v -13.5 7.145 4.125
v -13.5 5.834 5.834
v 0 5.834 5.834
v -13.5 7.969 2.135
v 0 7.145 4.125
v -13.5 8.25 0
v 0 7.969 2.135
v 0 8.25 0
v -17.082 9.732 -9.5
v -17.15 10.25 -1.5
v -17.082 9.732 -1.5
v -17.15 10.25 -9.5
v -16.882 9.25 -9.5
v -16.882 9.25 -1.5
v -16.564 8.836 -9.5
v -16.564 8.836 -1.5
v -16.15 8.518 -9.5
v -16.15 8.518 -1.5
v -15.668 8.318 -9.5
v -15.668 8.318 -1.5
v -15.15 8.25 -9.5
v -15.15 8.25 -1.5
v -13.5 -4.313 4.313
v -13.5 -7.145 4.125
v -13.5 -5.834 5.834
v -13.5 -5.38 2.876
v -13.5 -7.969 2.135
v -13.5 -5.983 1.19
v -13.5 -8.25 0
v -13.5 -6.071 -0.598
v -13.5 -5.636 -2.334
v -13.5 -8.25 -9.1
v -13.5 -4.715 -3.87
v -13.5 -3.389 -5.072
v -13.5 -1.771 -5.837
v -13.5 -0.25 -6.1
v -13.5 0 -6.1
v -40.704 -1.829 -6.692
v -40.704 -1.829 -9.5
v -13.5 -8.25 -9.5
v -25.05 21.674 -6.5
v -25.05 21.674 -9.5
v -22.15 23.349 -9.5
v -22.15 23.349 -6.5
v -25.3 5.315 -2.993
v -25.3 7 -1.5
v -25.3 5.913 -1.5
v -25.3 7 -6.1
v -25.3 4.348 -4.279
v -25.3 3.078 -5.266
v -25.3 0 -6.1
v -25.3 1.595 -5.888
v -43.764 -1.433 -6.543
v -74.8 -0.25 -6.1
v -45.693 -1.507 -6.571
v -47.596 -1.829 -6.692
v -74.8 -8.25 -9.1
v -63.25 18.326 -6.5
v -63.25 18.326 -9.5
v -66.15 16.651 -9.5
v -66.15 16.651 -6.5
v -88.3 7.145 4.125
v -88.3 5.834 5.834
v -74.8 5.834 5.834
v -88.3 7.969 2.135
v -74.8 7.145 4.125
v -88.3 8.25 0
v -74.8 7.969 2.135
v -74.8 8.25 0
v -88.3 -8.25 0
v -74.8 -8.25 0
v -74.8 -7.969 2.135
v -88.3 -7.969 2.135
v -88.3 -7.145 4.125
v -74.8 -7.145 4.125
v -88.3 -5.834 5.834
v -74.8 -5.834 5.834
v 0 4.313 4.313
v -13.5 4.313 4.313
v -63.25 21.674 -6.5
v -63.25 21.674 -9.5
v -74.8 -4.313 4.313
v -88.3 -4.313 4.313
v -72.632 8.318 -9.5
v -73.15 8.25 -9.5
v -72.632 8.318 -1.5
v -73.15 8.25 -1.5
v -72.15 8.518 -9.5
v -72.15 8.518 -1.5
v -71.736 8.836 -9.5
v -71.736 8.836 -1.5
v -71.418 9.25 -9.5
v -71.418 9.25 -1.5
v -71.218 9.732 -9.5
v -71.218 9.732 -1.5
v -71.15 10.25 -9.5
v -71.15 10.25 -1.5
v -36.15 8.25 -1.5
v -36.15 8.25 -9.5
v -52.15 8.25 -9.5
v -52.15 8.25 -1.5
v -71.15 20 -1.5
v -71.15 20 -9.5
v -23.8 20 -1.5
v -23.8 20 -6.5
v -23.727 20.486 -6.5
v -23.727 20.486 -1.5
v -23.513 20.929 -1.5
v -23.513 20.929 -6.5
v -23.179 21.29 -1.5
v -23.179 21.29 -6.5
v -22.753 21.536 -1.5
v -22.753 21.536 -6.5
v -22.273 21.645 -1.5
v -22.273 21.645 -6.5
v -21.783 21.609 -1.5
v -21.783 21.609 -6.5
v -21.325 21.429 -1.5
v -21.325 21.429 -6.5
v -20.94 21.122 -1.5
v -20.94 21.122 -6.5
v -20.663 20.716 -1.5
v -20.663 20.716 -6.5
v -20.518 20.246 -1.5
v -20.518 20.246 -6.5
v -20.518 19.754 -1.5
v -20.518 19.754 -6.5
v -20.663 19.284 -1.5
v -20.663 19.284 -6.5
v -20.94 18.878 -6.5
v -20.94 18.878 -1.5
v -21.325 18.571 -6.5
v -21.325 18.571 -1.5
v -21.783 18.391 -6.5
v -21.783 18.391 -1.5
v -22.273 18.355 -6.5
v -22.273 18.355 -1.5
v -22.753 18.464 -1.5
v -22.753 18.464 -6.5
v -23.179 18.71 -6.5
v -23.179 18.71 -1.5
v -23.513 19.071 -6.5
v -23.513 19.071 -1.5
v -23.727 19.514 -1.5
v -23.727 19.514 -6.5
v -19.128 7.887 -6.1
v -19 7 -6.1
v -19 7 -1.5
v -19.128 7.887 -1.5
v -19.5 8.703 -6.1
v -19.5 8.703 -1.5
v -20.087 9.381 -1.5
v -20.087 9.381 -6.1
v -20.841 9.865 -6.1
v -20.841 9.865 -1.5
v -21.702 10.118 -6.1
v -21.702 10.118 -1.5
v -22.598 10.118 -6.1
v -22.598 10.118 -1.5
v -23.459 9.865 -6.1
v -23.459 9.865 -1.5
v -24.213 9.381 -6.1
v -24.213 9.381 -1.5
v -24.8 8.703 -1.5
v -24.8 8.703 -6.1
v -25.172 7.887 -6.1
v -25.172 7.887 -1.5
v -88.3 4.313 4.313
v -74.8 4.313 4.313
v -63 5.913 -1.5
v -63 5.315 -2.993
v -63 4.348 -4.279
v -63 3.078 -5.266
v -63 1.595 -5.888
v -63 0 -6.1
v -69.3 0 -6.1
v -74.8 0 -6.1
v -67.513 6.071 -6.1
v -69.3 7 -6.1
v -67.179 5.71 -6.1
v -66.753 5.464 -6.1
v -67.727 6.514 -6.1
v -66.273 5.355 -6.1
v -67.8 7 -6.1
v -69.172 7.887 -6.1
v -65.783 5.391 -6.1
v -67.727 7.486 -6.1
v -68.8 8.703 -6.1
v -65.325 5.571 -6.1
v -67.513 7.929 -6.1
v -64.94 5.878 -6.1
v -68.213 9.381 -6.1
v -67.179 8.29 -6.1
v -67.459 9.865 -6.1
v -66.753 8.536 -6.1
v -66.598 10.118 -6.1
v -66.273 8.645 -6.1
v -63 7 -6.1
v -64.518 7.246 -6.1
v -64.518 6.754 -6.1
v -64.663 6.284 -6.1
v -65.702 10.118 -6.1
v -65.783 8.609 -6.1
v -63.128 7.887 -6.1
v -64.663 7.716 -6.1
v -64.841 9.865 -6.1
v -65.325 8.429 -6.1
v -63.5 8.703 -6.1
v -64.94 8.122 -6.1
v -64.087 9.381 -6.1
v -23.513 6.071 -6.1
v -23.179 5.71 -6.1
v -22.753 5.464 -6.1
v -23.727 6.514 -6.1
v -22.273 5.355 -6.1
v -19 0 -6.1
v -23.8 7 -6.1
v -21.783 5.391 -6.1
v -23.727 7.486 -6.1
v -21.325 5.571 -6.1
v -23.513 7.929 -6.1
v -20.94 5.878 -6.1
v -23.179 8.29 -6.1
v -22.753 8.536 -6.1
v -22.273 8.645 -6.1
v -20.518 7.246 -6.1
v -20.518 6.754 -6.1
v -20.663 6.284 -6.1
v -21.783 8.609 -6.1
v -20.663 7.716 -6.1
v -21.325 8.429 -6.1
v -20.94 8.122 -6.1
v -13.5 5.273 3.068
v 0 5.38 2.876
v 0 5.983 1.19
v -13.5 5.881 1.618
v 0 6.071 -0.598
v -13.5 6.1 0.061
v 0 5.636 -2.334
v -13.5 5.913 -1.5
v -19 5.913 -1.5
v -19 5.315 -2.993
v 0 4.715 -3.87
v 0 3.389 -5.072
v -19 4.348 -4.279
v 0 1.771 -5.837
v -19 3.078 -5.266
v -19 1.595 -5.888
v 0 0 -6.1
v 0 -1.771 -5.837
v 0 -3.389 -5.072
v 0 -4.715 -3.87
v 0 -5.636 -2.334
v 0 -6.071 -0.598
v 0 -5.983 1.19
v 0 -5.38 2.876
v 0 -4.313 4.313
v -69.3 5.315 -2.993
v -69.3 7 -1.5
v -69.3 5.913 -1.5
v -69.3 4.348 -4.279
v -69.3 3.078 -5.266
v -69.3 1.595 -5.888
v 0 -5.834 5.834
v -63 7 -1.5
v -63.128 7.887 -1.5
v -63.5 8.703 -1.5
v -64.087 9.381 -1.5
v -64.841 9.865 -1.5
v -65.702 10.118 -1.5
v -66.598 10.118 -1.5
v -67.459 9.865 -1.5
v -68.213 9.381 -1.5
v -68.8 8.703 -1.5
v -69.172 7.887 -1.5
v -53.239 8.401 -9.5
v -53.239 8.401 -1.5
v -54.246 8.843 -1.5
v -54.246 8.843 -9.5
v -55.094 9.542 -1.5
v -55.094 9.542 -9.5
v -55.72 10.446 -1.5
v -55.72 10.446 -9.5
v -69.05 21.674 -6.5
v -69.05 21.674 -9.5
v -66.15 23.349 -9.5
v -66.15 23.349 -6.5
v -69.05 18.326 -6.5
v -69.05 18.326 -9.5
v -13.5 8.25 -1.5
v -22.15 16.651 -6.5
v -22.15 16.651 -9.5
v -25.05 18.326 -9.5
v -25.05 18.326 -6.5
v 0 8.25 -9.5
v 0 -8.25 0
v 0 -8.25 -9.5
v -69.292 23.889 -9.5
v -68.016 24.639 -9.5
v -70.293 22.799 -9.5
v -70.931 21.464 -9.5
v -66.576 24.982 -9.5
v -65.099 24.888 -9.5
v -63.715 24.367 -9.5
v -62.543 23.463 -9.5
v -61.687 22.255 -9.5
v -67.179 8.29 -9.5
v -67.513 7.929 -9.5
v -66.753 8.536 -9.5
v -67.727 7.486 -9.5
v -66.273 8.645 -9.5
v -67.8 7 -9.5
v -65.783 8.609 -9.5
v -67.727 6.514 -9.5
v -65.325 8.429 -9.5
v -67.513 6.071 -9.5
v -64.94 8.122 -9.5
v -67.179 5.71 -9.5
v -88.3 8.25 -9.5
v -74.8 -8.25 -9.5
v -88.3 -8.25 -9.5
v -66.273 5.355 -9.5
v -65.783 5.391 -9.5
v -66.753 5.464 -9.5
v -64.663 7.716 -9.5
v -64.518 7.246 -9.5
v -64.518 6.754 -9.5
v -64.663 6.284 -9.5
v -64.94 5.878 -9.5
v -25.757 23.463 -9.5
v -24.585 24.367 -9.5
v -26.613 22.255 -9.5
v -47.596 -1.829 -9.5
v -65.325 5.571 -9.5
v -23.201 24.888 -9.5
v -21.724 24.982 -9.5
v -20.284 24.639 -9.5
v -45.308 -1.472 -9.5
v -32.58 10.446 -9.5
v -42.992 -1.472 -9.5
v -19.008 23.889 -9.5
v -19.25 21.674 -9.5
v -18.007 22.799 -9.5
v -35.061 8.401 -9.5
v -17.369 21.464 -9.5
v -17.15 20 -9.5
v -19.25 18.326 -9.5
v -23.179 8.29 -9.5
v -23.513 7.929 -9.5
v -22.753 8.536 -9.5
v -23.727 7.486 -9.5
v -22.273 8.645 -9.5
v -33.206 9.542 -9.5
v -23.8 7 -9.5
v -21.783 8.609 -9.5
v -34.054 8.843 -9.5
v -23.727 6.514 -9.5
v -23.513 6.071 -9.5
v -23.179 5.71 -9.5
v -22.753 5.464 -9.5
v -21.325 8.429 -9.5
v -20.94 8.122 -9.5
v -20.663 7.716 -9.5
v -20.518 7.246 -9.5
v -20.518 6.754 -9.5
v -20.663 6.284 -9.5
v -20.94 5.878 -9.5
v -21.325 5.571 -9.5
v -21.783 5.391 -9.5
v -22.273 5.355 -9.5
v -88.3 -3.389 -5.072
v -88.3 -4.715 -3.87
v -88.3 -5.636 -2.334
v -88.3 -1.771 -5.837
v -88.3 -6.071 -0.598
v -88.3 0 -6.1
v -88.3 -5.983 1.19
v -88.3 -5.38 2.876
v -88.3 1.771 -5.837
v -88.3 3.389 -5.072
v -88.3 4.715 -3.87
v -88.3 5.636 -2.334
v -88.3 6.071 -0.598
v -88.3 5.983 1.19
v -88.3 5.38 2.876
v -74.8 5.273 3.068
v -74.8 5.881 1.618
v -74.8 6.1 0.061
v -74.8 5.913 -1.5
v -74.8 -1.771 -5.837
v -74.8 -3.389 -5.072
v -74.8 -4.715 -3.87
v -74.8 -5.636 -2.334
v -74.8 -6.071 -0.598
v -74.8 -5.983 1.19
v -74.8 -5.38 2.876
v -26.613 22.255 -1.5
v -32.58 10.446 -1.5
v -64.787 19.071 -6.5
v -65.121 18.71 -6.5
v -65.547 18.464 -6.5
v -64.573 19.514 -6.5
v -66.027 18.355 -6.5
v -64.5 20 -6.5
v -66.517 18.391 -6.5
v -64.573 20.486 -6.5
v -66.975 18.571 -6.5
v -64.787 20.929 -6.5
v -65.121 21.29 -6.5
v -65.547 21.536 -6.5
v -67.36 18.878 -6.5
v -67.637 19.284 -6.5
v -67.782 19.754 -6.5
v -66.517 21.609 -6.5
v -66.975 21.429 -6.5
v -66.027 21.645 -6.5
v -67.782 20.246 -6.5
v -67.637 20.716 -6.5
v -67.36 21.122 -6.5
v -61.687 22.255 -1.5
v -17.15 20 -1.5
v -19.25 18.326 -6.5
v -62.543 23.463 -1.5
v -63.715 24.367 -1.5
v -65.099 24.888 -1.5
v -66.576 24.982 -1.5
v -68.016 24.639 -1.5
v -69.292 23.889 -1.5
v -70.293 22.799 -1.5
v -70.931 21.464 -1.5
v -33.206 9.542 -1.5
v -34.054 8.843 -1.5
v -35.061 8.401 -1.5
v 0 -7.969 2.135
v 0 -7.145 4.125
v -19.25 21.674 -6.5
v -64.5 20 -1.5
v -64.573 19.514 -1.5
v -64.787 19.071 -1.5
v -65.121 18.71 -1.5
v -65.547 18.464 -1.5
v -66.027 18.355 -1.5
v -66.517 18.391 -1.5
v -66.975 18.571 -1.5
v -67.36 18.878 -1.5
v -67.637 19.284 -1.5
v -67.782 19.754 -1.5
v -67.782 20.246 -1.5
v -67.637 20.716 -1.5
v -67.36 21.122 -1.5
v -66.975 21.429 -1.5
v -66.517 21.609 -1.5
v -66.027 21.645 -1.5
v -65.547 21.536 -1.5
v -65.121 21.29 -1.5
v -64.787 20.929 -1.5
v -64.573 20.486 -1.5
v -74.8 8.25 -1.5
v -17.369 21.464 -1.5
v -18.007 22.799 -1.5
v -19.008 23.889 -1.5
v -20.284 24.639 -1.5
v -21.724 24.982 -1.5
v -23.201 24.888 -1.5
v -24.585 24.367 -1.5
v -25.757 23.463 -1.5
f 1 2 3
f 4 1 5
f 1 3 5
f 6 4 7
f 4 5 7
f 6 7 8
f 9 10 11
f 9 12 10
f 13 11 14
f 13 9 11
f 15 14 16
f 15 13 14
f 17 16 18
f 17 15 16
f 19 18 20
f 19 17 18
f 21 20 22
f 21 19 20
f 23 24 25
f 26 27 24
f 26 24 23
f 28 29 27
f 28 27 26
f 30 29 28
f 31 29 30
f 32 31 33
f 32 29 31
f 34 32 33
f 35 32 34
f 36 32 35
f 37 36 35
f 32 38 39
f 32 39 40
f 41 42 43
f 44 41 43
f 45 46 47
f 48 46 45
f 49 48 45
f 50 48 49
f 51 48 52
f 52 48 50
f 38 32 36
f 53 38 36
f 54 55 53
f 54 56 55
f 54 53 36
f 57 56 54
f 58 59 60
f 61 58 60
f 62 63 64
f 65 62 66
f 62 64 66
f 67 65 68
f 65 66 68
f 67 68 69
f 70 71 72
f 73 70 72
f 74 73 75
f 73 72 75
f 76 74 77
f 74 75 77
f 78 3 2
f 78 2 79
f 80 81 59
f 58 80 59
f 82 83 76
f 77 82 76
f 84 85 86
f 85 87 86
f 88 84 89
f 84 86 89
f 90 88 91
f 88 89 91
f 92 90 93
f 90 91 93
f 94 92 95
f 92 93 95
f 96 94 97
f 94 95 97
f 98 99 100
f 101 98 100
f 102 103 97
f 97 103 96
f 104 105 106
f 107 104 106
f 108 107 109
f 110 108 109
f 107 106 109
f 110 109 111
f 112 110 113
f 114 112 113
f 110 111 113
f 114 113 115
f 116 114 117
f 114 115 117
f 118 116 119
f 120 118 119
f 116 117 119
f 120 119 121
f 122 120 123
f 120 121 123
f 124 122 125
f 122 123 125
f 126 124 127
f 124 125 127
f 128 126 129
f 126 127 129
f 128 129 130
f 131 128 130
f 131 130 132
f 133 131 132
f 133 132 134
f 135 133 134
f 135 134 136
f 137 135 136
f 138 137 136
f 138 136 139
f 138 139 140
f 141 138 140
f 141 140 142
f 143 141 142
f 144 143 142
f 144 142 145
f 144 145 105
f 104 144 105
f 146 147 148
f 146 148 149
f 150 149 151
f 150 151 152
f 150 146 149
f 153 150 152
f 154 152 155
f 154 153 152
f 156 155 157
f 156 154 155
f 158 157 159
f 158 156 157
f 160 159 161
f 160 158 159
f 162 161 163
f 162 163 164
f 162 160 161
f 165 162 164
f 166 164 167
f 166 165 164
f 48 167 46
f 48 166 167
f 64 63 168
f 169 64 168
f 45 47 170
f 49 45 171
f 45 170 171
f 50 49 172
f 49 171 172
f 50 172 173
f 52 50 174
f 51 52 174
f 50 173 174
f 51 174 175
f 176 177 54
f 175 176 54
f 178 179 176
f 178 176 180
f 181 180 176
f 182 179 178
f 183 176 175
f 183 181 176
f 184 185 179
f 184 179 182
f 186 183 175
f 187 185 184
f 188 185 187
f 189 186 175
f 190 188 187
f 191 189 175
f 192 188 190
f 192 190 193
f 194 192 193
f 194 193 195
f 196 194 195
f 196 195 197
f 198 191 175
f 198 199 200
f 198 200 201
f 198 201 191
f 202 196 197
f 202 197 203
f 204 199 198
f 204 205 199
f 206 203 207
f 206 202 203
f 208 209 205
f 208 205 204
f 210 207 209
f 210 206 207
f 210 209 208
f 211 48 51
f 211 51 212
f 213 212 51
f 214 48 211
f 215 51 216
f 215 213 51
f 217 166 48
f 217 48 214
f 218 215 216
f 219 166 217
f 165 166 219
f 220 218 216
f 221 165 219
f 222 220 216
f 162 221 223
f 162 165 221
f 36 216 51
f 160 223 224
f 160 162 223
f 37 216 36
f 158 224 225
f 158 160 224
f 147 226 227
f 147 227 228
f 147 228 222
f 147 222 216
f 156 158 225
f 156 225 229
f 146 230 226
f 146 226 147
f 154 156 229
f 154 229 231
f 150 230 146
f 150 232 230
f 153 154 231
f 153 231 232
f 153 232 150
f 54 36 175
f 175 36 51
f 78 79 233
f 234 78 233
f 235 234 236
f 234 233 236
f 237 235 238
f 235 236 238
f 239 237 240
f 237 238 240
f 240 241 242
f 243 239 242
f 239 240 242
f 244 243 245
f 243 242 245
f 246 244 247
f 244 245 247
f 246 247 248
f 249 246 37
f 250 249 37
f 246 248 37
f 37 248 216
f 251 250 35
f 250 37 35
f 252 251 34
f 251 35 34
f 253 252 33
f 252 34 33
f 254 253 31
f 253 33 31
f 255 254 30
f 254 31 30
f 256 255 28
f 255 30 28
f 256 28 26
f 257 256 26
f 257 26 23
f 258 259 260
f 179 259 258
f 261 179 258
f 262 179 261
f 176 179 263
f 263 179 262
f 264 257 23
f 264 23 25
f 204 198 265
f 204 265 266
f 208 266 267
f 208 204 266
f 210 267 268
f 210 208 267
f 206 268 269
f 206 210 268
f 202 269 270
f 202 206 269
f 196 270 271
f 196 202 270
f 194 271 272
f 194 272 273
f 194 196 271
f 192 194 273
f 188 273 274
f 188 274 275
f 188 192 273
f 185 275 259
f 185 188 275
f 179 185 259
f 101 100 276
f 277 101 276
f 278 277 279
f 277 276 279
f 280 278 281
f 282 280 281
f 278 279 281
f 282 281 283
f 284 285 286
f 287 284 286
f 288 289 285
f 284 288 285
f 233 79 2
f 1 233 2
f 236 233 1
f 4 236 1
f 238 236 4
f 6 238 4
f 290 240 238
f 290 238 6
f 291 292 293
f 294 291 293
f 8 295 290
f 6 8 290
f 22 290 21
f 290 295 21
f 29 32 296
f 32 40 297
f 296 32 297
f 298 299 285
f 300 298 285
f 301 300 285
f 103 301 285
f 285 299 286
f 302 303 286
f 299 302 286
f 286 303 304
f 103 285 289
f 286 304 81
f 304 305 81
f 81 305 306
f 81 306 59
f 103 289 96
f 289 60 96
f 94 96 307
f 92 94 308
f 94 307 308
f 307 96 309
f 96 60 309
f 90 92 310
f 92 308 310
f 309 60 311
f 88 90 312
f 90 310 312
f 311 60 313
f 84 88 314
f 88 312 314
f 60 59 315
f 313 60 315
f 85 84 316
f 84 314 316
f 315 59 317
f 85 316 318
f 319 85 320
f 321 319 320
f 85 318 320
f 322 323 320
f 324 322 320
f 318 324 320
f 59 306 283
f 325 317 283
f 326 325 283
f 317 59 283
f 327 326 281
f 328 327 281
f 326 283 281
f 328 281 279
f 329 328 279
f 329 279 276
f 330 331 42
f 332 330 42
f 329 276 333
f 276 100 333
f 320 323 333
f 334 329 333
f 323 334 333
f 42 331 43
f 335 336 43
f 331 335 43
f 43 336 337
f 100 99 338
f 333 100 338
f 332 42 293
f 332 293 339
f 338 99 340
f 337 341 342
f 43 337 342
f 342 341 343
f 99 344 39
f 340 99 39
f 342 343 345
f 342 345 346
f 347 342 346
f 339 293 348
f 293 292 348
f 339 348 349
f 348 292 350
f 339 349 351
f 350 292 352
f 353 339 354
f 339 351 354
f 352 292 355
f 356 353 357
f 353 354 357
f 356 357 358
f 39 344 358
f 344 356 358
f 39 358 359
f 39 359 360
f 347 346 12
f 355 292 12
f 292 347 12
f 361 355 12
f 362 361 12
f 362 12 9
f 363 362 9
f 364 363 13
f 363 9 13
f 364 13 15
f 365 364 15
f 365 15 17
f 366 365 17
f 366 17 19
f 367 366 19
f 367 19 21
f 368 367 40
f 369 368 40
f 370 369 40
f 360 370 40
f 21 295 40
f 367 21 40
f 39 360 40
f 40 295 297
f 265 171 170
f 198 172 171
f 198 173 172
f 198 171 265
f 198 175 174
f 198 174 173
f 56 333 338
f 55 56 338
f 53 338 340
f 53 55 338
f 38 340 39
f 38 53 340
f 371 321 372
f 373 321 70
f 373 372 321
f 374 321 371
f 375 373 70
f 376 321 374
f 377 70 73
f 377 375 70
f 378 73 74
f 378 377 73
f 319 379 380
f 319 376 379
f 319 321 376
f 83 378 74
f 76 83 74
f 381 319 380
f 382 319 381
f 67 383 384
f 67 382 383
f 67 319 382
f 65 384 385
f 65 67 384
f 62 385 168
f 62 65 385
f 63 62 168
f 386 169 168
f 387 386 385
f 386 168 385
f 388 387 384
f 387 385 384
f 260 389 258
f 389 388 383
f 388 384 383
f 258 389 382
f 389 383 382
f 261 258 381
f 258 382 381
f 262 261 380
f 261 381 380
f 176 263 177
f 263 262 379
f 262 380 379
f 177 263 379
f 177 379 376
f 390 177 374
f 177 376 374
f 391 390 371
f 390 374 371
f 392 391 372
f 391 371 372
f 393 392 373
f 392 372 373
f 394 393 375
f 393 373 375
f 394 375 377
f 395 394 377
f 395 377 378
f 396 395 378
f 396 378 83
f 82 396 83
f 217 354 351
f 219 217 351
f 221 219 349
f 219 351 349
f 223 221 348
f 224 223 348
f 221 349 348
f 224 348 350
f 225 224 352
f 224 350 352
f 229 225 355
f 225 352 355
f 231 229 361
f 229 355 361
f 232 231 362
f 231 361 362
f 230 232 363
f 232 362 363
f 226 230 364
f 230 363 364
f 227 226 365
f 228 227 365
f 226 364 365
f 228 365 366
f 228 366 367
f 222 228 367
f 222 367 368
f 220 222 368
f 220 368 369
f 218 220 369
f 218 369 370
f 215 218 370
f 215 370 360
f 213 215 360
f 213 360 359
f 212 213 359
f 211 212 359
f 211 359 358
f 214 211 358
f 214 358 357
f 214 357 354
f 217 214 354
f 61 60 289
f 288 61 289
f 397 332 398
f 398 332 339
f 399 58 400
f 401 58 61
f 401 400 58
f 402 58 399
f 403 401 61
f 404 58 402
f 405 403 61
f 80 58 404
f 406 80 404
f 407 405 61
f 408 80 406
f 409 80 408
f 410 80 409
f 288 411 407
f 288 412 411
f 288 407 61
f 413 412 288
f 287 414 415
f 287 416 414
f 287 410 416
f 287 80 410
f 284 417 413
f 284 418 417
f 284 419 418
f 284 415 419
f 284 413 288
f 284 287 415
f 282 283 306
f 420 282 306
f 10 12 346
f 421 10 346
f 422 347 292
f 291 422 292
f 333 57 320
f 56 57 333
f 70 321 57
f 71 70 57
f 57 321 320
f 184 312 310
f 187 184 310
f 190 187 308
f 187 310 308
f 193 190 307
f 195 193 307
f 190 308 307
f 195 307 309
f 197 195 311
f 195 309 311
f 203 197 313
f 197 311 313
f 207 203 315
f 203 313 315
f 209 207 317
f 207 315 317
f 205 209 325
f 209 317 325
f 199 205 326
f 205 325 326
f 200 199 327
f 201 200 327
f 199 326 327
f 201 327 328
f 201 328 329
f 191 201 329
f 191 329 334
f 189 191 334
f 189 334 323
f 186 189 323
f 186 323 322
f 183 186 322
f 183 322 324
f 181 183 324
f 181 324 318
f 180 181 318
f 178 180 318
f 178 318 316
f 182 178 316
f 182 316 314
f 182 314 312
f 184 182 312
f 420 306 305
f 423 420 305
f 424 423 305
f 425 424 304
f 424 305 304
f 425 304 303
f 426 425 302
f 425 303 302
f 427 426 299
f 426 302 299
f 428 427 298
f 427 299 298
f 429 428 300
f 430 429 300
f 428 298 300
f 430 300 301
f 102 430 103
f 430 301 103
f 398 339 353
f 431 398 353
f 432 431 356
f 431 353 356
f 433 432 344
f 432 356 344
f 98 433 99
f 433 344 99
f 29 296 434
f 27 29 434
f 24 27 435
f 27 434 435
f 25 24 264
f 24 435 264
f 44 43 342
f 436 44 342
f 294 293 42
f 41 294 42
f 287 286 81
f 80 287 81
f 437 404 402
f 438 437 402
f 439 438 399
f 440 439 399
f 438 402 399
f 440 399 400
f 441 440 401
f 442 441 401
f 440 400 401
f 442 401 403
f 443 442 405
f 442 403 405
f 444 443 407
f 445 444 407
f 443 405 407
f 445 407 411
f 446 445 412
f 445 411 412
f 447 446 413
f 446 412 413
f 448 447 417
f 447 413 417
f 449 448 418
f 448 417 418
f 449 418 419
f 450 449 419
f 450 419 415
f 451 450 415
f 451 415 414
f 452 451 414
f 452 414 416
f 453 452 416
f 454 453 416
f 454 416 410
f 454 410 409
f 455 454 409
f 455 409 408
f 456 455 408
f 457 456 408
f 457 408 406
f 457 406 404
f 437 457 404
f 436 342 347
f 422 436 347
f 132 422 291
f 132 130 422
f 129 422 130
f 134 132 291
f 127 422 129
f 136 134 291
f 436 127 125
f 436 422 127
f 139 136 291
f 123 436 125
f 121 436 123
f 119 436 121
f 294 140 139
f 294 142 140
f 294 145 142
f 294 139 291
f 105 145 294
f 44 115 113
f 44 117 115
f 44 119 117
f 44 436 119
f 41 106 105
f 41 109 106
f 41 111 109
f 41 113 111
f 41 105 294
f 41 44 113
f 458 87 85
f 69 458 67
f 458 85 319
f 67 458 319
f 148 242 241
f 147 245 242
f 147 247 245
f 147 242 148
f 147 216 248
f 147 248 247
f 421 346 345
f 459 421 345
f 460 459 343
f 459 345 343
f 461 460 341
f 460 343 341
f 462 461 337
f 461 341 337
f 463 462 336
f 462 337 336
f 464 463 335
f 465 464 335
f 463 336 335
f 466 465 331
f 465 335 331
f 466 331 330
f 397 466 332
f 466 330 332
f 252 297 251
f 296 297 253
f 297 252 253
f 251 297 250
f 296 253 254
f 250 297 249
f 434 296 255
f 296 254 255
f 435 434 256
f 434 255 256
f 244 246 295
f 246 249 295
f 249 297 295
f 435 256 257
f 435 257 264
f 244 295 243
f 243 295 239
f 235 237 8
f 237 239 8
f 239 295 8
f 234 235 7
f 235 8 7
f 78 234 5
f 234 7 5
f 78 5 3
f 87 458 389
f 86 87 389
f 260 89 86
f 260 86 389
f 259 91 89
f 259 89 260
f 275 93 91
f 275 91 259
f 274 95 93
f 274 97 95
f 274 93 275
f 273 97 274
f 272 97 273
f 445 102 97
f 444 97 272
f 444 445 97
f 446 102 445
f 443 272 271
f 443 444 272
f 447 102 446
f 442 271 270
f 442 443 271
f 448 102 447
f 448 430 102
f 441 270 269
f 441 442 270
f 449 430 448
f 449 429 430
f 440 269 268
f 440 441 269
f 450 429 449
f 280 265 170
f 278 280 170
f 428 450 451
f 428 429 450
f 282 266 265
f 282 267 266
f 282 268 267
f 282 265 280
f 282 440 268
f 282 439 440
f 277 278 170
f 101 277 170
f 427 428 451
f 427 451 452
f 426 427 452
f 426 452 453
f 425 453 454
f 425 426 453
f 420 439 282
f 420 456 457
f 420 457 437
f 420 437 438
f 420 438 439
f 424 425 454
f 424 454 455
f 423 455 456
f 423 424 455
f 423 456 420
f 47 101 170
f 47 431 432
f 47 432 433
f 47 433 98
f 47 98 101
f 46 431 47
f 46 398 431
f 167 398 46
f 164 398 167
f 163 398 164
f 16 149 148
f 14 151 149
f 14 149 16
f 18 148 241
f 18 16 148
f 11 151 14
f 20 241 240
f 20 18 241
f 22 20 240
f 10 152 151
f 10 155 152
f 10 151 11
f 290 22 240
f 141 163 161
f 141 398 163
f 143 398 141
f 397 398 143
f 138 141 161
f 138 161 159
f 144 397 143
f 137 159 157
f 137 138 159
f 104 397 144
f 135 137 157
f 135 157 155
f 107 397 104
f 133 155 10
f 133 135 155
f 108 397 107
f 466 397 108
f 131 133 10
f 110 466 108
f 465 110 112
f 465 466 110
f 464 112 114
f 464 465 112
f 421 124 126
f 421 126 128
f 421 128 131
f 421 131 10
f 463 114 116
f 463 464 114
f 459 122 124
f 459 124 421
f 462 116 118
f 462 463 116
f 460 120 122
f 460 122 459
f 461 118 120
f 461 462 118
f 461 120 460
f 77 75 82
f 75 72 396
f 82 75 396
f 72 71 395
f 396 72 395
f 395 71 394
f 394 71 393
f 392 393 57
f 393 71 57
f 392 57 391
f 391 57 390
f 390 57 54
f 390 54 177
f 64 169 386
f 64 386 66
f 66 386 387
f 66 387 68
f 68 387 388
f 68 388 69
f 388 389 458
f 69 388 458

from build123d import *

# Parameters (mm, degrees)
BOSS_EXTRUDE1_DEPTH = 88.3
SKETCH6_R           = 1.65
BOSS_EXTRUDE2_DEPTH = 8
CUT_EXTRUDE1_DEPTH  = 93.261259475
SKETCH8_W           = 61.3
SKETCH8_H           = 21.483950942
CUT_EXTRUDE2_DEPTH  = 93.118890571
SKETCH9_W           = 61.3
SKETCH9_H           = 11.699409457
CUT_EXTRUDE3_DEPTH  = 93.543511645
SKETCH10_R          = 1.65
CUT_EXTRUDE4_DEPTH  = 94.043055829
CHAMFER1_SIZE       = 8
CHAMFER1_SIZE2      = 3
CUT_EXTRUDE5_DEPTH  = 93.54351174
FILLET1_R           = 2
CUT_EXTRUDE6_DEPTH  = 3
CUT_EXTRUDE7_START  = -4.6
CUT_EXTRUDE7_DEPTH  = 4.6


with BuildPart() as part:
    # Sketch1 → Boss-Extrude1 (new body)
    with BuildSketch(Plane.ZY):
        with BuildLine():
            Line((-9.5, 8.25), (-9.5, -8.25))
            Line((-9.5, -8.25), (0, -8.25))
            ThreePointArc((0, -8.25), (8.25, 0), (0, 8.25))
            Line((0, 8.25), (-9.5, 8.25))
        make_face()
    extrude(amount=BOSS_EXTRUDE1_DEPTH)

    # Sketch6 → Boss-Extrude2 (add)
    with BuildSketch(Plane(origin=(0, 0, -9.5), x_dir=(-1, 0, 0), z_dir=(0, 0, -1))):
        with BuildLine():
            Line((17.15, -8.25), (17.15, 20))
            ThreePointArc((17.15, 20), (20.99096395, 24.863808737), (26.612654174, 22.254931867))
            Line((26.612654174, 22.254931867), (32.579554775, 10.446054507))
            ThreePointArc((32.579554775, 10.446054507), (34.053942202, 8.842964487), (36.149678114, 8.25))
            Line((36.149678114, 8.25), (52.150321886, 8.25))
            ThreePointArc((52.150321886, 8.25), (54.246057798, 8.842964487), (55.720445225, 10.446054507))
            Line((55.720445225, 10.446054507), (61.687345826, 22.254931867))
            ThreePointArc((61.687345826, 22.254931867), (67.30903605, 24.863808737), (71.15, 20))
            Line((71.15, 20), (71.15, -8.25))
            Line((71.15, -8.25), (17.15, -8.25))
        make_face()
        with Locations((22.15, 20)):
            Circle(SKETCH6_R, mode=Mode.SUBTRACT)
        with Locations(Location((66.15, 20, 0), (0, 0, 180))):
            Circle(SKETCH6_R, mode=Mode.SUBTRACT)
    extrude(amount=-BOSS_EXTRUDE2_DEPTH)

    # Sketch7 → Cut-Extrude1 (cut, through all)
    with BuildSketch(Plane.ZY.offset(88.3)):
        with BuildLine():
            Line((13.481907846, 13.481907846), (4.313351365, 4.313351365))
            ThreePointArc((4.313351365, 4.313351365), (-6.1, 0), (4.313351365, -4.313351365))
            Line((4.313351365, -4.313351365), (13.481907846, -13.481907846))
            Line((13.481907846, -13.481907846), (13.481907846, 13.481907846))
        make_face()
    extrude(amount=-CUT_EXTRUDE1_DEPTH, mode=Mode.SUBTRACT)

    # Sketch8 → Cut-Extrude2 (cut, through all)
    with BuildSketch(Plane.XY.offset(-1.5)):
        with Locations((-44.15, -2.491975471)):
            Rectangle(SKETCH8_W, SKETCH8_H)
    extrude(amount=CUT_EXTRUDE2_DEPTH, mode=Mode.SUBTRACT)

    # Sketch9 → Cut-Extrude3 (cut, through all)
    with BuildSketch(Plane(origin=(0, 0, -6.1), x_dir=(-1, 0, 0), z_dir=(0, 0, -1))):
        with Locations((44.15, -5.849704729)):
            Rectangle(SKETCH9_W, SKETCH9_H)
    extrude(amount=-CUT_EXTRUDE3_DEPTH, mode=Mode.SUBTRACT)

    # Sketch10 → Cut-Extrude4 (cut, through all)
    with BuildSketch(Plane(origin=(0, 0, -9.5), x_dir=(-1, 0, 0), z_dir=(0, 0, -1))):
        with Locations((22.15, 7)):
            Circle(SKETCH10_R)
        with Locations((66.15, 7)):
            Circle(SKETCH10_R)
    extrude(amount=-CUT_EXTRUDE4_DEPTH, mode=Mode.SUBTRACT)

    # Chamfer1
    chamfer1_edges = [part.edges().sort_by_distance(p)[0] for p in [
        (-44.15, -8.25, -6.1),
    ]]
    chamfer1_side = [part.faces().sort_by_distance(p)[0] for p in [
        (-44.15, -4.125, -6.1),
    ]]
    chamfer(chamfer1_edges, length=CHAMFER1_SIZE, length2=CHAMFER1_SIZE2, reference=chamfer1_side[0])

    # Sketch11 → Cut-Extrude5 (cut, through all)
    with BuildSketch(Plane(origin=(0, 0, -6.1), x_dir=(-1, 0, 0), z_dir=(0, 0, -1))):
        with BuildLine():
            Line((74.8, -8.25), (47.5958626, -1.828822614))
            ThreePointArc((47.5958626, -1.828822614), (44.15, -1.427659244), (40.7041374, -1.828822614))
            Line((40.7041374, -1.828822614), (13.5, -8.25))
            Line((13.5, -8.25), (13.5, -16.427659244))
            Line((13.5, -16.427659244), (74.8, -16.427659244))
            Line((74.8, -16.427659244), (74.8, -8.25))
        make_face()
    extrude(amount=CUT_EXTRUDE5_DEPTH, mode=Mode.SUBTRACT)

    # Fillet1
    fillet1_edges = [part.edges().sort_by_distance(p)[0] for p in [
        (-17.15, 8.25, -5.5),
        (-71.15, 8.25, -5.5),
    ]]
    fillet(fillet1_edges, radius=FILLET1_R)

    # Sketch12 → Cut-Extrude6 (cut)
    with BuildSketch(Plane(origin=(0, 0, -9.5), x_dir=(-1, 0, 0), z_dir=(0, 0, -1))):
        Polygon((22.15, 16.651368439), (25.05, 18.325684219), (25.05, 21.674315781), (22.15, 23.348631561), (19.25, 21.674315781), (19.25, 18.325684219), align=None)
        Polygon((66.15, 16.651368439), (69.05, 18.325684219), (69.05, 21.674315781), (66.15, 23.348631561), (63.25, 21.674315781), (63.25, 18.325684219), align=None)
    extrude(amount=-CUT_EXTRUDE6_DEPTH, mode=Mode.SUBTRACT)

    # Sketch13 → Cut-Extrude7 (cut)
    with BuildSketch(Plane.XY.offset(-1.5).offset(CUT_EXTRUDE7_START)):
        with BuildLine():
            Line((-69.3, 7), (-69.3, -2.12397244))
            Line((-69.3, -2.12397244), (-63, -2.12397244))
            Line((-63, -2.12397244), (-63, 7))
            ThreePointArc((-63, 7), (-66.15, 10.15), (-69.3, 7))
        make_face()
        with BuildLine():
            Line((-25.3, 7), (-25.3, -2.12397244))
            Line((-25.3, -2.12397244), (-19, -2.12397244))
            Line((-19, -2.12397244), (-19, 7))
            ThreePointArc((-19, 7), (-22.15, 10.15), (-25.3, 7))
        make_face()
    extrude(amount=CUT_EXTRUDE7_DEPTH, mode=Mode.SUBTRACT)


solid = part.part
